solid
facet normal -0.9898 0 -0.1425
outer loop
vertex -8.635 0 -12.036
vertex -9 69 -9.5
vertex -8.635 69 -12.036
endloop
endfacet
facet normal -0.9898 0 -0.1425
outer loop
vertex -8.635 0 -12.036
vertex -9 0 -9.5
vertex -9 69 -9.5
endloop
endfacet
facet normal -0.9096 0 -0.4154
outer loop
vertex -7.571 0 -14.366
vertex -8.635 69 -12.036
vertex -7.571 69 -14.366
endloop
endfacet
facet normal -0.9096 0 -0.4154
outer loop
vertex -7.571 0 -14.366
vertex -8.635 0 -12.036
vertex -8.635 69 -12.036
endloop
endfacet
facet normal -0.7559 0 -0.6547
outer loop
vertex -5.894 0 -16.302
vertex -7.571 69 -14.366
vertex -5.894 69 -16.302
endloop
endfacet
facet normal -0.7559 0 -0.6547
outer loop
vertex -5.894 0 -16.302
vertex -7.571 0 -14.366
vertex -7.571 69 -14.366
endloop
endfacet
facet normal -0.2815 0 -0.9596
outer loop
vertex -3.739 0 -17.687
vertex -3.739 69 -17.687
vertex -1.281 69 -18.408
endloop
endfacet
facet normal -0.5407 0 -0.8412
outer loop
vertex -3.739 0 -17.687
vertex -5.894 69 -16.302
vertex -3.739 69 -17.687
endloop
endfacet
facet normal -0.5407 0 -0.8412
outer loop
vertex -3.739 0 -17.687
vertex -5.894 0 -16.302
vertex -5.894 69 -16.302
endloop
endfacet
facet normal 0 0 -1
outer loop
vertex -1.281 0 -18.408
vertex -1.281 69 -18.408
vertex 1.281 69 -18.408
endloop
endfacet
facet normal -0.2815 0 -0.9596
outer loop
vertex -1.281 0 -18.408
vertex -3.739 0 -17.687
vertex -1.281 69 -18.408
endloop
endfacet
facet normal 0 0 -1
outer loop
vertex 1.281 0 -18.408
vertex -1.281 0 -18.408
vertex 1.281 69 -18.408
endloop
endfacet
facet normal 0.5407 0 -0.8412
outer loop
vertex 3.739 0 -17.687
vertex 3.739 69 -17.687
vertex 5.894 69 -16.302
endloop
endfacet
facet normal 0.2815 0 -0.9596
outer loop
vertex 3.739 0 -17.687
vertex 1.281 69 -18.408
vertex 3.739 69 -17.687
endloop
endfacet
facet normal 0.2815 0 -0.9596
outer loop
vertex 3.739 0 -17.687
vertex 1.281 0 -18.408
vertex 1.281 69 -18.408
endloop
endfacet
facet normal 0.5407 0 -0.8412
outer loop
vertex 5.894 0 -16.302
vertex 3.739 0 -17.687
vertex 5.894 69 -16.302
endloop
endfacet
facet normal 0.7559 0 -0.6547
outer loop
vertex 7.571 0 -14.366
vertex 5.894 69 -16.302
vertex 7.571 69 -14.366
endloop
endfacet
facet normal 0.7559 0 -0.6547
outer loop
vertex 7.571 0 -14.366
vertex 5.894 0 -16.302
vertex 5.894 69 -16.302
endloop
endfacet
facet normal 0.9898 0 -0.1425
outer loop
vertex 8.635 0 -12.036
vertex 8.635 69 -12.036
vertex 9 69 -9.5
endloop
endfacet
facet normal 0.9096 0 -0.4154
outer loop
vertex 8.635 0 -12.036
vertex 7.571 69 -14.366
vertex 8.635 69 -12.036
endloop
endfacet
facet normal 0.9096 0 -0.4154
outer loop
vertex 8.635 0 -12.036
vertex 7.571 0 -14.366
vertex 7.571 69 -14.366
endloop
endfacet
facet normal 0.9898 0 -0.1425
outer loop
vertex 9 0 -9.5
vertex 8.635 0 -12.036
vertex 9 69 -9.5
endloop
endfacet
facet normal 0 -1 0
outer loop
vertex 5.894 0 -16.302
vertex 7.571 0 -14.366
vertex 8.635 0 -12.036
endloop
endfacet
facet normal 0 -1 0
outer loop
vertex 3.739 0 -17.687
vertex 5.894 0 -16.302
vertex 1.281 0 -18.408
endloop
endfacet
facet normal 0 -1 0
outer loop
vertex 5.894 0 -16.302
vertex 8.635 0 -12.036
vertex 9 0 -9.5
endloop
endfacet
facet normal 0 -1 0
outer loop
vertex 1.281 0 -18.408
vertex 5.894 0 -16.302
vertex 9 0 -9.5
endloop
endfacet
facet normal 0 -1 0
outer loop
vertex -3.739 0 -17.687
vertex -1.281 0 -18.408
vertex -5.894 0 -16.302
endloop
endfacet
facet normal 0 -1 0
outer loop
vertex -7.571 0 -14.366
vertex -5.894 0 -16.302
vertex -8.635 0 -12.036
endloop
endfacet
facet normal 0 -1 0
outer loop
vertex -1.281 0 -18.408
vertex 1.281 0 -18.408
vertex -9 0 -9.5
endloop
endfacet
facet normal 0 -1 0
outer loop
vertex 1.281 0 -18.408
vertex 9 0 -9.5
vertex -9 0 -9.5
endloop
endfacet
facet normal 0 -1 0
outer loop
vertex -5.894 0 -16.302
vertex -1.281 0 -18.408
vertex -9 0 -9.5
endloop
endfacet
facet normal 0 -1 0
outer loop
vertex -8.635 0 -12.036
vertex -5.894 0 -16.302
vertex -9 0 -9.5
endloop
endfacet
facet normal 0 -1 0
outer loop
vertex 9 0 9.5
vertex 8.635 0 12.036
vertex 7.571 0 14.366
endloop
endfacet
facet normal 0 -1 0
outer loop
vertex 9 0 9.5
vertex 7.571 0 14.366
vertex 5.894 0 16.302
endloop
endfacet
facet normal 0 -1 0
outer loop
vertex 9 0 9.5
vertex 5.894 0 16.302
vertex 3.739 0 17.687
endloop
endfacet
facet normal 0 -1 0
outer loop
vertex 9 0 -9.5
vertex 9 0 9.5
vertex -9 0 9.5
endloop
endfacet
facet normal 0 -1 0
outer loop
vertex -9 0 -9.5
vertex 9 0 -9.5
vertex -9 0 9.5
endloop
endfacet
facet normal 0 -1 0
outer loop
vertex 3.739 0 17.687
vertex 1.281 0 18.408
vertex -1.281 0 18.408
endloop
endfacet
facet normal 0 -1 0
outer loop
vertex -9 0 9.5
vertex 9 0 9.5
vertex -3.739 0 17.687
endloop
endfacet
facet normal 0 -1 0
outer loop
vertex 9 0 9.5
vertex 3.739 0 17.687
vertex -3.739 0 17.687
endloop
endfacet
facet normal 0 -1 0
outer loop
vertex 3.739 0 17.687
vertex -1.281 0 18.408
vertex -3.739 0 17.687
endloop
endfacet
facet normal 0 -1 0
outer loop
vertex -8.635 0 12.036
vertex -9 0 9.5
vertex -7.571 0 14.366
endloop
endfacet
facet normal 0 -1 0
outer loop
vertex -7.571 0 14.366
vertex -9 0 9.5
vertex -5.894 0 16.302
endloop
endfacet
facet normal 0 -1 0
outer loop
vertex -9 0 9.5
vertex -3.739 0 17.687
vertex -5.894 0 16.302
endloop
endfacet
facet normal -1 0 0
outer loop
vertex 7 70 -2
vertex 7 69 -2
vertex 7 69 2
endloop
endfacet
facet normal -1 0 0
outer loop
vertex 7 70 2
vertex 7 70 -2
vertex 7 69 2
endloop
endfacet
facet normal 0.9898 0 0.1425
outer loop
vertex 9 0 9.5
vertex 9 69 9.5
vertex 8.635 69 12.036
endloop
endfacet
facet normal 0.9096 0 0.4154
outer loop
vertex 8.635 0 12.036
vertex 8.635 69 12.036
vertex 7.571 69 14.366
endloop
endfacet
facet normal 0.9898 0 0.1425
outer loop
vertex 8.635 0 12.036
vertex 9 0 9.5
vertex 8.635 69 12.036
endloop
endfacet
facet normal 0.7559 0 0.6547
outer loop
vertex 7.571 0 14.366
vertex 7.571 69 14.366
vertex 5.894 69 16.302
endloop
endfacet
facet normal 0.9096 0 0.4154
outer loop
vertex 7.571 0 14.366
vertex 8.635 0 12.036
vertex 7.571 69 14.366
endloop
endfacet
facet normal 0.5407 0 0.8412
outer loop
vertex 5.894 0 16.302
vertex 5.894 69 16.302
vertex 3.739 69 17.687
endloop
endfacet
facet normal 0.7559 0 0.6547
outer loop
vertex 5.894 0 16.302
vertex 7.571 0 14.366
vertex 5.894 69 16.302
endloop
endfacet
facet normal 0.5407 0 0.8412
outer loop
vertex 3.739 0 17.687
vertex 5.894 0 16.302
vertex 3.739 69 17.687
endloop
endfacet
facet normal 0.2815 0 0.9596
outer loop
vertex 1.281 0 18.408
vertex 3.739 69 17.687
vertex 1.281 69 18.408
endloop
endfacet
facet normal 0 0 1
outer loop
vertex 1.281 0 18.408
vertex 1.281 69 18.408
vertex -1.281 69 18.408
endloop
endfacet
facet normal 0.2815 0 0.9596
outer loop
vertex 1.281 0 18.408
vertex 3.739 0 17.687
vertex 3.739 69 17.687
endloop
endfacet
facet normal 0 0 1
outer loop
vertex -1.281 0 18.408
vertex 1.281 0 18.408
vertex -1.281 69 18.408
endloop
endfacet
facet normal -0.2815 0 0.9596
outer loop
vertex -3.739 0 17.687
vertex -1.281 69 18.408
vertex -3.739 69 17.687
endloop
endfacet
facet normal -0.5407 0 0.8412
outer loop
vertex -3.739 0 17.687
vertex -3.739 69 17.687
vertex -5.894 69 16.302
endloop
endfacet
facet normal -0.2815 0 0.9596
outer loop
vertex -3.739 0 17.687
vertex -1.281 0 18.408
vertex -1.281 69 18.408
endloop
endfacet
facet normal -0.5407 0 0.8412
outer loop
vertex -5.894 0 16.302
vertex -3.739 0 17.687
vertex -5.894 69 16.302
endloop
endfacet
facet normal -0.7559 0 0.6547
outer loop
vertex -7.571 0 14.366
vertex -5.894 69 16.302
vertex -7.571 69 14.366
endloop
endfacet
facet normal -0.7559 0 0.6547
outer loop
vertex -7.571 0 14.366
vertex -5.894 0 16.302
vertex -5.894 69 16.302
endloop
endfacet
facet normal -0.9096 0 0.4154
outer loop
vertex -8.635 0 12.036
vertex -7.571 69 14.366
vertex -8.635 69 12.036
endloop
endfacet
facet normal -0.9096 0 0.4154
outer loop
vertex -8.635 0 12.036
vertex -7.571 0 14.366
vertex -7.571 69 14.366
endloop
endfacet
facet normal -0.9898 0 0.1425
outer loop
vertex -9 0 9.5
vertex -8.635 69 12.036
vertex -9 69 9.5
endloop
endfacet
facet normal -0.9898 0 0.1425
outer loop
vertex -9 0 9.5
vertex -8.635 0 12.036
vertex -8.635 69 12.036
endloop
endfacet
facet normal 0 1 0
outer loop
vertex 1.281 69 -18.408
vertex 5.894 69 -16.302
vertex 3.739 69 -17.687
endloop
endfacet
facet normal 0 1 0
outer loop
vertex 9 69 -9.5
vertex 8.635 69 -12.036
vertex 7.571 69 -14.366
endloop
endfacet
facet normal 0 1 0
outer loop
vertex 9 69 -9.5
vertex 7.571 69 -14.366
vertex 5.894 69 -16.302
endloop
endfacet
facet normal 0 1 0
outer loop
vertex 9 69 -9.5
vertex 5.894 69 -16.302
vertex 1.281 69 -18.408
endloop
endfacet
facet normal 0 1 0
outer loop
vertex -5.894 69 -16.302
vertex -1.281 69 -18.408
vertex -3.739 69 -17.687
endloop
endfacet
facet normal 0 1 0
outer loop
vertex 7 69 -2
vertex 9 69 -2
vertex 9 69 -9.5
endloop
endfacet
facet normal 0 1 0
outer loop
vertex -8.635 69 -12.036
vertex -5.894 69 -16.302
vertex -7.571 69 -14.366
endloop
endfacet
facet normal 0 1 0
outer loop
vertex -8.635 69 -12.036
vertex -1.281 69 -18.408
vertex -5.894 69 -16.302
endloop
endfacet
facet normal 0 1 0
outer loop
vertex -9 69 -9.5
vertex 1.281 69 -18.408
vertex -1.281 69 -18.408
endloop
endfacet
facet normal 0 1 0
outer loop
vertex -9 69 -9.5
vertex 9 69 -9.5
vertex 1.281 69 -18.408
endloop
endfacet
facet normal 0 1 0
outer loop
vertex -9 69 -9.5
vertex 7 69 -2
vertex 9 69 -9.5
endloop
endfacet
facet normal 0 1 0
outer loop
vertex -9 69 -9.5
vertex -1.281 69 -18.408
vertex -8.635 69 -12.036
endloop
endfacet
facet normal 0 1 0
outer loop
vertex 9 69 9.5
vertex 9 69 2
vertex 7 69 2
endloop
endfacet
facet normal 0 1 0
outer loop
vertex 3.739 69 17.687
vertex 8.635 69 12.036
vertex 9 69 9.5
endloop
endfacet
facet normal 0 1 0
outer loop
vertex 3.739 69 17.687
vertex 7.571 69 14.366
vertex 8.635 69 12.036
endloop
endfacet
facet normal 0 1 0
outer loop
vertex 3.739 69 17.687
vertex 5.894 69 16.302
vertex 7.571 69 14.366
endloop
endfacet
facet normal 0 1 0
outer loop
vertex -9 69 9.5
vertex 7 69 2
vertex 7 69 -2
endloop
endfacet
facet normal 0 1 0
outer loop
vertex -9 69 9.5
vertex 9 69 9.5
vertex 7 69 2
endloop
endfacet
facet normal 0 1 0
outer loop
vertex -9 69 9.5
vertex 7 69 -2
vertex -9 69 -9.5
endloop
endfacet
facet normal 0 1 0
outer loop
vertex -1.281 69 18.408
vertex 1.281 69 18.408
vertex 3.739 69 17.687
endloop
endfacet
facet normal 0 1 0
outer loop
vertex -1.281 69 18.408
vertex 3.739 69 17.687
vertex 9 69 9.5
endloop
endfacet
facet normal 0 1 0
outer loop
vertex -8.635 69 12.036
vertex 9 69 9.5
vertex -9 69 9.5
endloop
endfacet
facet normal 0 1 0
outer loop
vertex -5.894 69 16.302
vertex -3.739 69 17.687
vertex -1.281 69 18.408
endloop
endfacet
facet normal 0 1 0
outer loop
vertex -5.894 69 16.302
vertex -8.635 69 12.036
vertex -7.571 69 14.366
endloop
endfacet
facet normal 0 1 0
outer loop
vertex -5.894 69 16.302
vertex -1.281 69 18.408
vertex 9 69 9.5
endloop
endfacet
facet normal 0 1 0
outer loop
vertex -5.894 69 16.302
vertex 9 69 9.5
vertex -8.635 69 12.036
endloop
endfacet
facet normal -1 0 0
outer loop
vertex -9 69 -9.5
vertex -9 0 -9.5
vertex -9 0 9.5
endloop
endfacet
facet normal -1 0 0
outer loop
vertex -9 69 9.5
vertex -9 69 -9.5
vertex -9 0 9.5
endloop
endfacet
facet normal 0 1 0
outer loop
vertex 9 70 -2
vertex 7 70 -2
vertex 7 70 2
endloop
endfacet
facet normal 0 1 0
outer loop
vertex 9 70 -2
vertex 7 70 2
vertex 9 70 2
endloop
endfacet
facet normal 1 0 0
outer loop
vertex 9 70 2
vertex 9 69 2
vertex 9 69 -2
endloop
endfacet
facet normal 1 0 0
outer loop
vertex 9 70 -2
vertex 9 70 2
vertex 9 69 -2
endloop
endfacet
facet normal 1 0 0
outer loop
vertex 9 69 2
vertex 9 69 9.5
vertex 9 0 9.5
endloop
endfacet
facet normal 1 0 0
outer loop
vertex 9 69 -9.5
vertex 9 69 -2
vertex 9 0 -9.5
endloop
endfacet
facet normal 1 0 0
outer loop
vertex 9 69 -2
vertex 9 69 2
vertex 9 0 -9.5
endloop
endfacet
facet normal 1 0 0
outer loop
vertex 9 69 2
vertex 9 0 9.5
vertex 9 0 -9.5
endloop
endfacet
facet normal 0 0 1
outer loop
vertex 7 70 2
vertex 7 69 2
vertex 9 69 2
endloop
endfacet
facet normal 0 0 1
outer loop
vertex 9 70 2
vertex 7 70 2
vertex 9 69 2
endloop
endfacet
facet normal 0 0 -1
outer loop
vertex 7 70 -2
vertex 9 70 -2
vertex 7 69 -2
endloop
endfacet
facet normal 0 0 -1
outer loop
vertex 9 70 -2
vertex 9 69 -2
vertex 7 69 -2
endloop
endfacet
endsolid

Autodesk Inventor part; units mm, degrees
ref_plane "YZ Plane" through (0, 0, 0) normal (1, 0, 0) x (0, 1, 0)
ref_plane "XZ Plane" through (0, 0, 0) normal (0, 1, 0) x (-1, 0, 0)
ref_plane "XY Plane" through (0, 0, 0) normal (0, 0, 1) x (1, 0, 0)
sketch "Sketch1" plane through (0, 0, 0) normal (0, 1, 0) x (-1, 0, 0)
  line L0 (0, 18.5) -> (0, 18.5)
  line L1 (-9, 9.5) -> (-9, -9.5)
  line L2 (0, -18.5) -> (0, -18.5)
  line L3 (9, -9.5) -> (9, 9.5)
  arc A0 (9, 9.5) -> (0, 18.5) centre (0, 9.5) ccw
  arc A1 (0, -18.5) -> (9, -9.5) centre (0, -9.5) ccw
  arc A2 (-9, -9.5) -> (0, -18.5) centre (0, -9.5) ccw
  arc A3 (0, 18.5) -> (-9, 9.5) centre (0, 9.5) ccw
  point P0 (0, 0)
  point P1 (-9, -18.5)
  point P2 (-9, 18.5)
  point P3 (9, -18.5)
  point P4 (0, -18.5)
  dimension "d0" = 18
  dimension "d1" = 37
  dimension "d2" = 18.5
  dimension "d3" = 9
  dimension "d4" = 9
extrude "Extrusion1" add sketch "Sketch1" along normal blind 69
sketch "Sketch2" plane through (0, 69, 0) normal (0, 1, 0) x (1, 0, 0)
  line L0 (9, -9.5) -> (9, 9.5) projected
  line L1 (9, 2) -> (7, 2)
  line L2 (7, 2) -> (7, -2)
  line L3 (7, -2) -> (9, -2)
  line L4 (9, -2) -> (9, 2)
  point P0 (0, 0)
  dimension "d7" = 2
  dimension "d8" = 4
  dimension "d9" = 2
extrude "Extrusion2" add sketch "Sketch2" along normal blind 1
equation "\"d2\" = 0.5 * d1"
equation "\"d3\" = 0.5 * d0"
equation "\"d8\" = 2 * d7"
equation "\"d9\" = 0.5 * d8"
properties part number "Battery"
